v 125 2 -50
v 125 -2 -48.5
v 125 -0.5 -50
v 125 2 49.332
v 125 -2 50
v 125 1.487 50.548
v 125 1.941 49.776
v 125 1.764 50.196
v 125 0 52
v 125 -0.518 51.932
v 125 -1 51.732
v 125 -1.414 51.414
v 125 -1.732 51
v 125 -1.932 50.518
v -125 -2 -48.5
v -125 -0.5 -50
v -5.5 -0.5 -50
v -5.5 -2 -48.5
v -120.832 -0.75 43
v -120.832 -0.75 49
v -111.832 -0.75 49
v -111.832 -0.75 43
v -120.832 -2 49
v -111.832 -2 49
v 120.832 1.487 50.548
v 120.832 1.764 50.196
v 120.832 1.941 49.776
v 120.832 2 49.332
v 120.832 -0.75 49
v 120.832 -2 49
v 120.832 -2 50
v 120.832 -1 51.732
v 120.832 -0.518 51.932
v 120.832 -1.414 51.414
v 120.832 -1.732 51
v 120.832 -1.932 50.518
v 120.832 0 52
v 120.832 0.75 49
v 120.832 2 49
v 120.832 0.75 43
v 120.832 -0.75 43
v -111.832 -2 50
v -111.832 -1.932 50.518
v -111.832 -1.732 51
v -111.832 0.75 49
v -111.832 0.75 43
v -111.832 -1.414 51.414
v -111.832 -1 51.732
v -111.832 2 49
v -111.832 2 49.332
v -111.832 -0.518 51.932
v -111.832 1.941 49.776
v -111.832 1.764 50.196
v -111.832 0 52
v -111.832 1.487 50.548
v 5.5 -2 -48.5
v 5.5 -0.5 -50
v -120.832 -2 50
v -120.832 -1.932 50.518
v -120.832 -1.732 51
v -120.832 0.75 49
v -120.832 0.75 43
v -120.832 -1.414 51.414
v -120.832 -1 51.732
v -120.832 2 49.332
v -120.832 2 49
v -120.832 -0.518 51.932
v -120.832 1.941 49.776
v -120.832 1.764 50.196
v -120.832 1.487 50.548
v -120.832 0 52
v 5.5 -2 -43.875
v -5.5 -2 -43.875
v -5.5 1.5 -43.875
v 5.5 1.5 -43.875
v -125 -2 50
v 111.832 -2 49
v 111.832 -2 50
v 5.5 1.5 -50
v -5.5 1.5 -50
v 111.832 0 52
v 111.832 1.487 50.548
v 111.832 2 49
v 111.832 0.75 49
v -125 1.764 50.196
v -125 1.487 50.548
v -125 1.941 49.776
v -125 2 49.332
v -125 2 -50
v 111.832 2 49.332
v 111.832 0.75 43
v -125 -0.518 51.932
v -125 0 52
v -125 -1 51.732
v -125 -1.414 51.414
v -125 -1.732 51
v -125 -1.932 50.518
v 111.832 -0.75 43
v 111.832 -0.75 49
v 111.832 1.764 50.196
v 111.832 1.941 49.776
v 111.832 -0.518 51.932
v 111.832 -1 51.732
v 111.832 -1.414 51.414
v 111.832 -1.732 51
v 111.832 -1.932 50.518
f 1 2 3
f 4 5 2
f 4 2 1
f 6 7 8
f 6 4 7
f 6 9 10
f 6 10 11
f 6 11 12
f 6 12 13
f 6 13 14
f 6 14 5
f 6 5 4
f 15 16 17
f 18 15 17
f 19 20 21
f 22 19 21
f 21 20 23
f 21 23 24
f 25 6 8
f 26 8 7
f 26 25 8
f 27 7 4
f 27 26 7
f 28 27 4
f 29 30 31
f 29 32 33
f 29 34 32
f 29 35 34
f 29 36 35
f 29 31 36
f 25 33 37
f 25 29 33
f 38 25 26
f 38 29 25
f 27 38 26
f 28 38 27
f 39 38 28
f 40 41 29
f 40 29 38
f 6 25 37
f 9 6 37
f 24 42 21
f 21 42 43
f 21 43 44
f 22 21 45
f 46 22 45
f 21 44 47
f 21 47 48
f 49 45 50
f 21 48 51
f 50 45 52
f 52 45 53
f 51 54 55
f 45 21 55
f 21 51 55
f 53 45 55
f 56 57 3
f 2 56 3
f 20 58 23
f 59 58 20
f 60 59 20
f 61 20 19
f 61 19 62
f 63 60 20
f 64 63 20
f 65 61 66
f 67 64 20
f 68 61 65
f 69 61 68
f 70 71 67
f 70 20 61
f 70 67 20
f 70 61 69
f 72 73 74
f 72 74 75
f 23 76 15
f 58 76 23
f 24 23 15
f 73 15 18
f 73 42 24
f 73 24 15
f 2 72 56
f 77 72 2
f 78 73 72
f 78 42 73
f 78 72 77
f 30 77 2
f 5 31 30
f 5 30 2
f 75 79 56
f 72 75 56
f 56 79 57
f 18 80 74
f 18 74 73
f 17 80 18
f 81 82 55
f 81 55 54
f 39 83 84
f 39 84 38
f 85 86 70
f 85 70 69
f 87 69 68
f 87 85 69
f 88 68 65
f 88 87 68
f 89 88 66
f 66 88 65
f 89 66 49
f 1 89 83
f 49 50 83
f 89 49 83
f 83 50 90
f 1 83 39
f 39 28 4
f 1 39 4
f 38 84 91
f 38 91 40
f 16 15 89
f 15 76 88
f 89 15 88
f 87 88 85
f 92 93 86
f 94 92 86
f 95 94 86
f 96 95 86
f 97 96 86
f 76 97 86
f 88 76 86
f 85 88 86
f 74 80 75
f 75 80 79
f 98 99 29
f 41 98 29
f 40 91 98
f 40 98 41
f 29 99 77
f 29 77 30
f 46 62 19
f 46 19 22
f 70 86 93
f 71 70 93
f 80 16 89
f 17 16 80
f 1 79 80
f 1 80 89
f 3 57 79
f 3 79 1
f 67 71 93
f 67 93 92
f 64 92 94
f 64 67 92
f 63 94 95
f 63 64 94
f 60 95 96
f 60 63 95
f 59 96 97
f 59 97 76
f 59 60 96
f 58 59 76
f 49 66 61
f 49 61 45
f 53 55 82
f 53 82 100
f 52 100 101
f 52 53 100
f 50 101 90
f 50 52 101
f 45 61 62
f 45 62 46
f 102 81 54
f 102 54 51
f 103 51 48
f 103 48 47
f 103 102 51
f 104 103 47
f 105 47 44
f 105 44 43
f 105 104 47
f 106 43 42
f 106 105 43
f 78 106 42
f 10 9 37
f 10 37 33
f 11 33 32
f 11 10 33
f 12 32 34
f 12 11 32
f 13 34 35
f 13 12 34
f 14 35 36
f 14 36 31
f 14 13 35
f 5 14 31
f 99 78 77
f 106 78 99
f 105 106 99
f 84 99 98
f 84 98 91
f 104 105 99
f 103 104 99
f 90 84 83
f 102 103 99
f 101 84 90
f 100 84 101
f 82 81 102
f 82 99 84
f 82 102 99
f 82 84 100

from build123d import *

# Parameters (mm, degrees)
F0_W      = 250
F0_H      = 100
F1_DEPTH  = 2
F4_DEPTH  = 250
F5_R      = 1.7
F3_W      = 9
F3_H      = 4.2
F8_DEPTH  = 1
F9_W      = 9
F9_H      = 1.5
F10_DEPTH = 6
F11_DEPTH = 25.4
F12_DEPTH = 6
F13_W     = 11
F13_H     = 3.5
F14_DEPTH = 6.125
F15_SIZE  = 1.5


with BuildPart() as f1:
    # F0 (on Front) → F1 (new body, symmetric)
    with BuildSketch(Plane.XZ):
        Rectangle(F0_W, F0_H)
    extrude(amount=F1_DEPTH, both=True)

    # F2 (on face) → F4 (join)
    with BuildSketch(Plane.YZ.offset(125)):
        with BuildLine():
            Line((1.9994144921, 50.048391), (0, 52))
            ThreePointArc((0, 52), (-1.4142135624, 51.4142135624), (-2, 50))
            Line((-2, 50), (2, 50))
            ThreePointArc((2, 50), (1.9998536177, 50.024197271), (1.9994144921, 50.048391))
        make_face()
    extrude(amount=-F4_DEPTH)

    # F5
    f5_edges = [f1.edges().sort_by_distance(p)[0] for p in [
        (0, 1.999414, 50.048391),
    ]]
    fillet(f5_edges, radius=F5_R)


with BuildPart() as f6_1:
    # F6: copy of F1
    add(f1.part)


with BuildPart() as f1_1:
    add(f1.part)

    # F3 (on face) → F8 (cut)
    with BuildSketch(Plane.XY.offset(50)):
        with Locations((-116.3319962025, 7.49e-08)):
            Rectangle(F3_W, F3_H)
        with Locations((116.3319962025, 7.49e-08)):
            Rectangle(F3_W, F3_H)
    extrude(amount=-F8_DEPTH, mode=Mode.SUBTRACT)

    # F9 (on face) → F10 (cut)
    with BuildSketch(Plane.XY.offset(49)):
        with Locations((-116.3319962025, -6.5e-09)):
            Rectangle(F9_W, F9_H)
    extrude(amount=-F10_DEPTH, mode=Mode.SUBTRACT)

    # F3 (on face) → F11 (cut)
    with BuildSketch(Plane.XY.offset(50)):
        with Locations((-116.3319962025, 7.49e-08)):
            Rectangle(F3_W, F3_H)
        with Locations((116.3319962025, 7.49e-08)):
            Rectangle(F3_W, F3_H)
    extrude(amount=F11_DEPTH, mode=Mode.SUBTRACT)

    # F9 (on face) → F12 (cut)
    with BuildSketch(Plane.XY.offset(49)):
        with Locations((-116.3319962025, -6.5e-09)):
            Rectangle(F9_W, F9_H)
        with Locations((116.3319962025, -6.5e-09)):
            Rectangle(F9_W, F9_H)
    extrude(amount=-F12_DEPTH, mode=Mode.SUBTRACT)

    # F13 (on face) → F14 (cut)
    with BuildSketch(Plane(origin=(0, 0, -50), x_dir=(1, 0, 0), z_dir=(0, 0, -1))):
        with Locations((0, 0.25)):
            Rectangle(F13_W, F13_H)
    extrude(amount=-F14_DEPTH, mode=Mode.SUBTRACT)

    # F15
    f15_edges = [f1_1.edges().sort_by_distance(p)[0] for p in [
        (65.25, -2, -50),
        (-65.25, -2, -50),
    ]]
    chamfer(f15_edges, length=F15_SIZE)


solid = f1_1.part
